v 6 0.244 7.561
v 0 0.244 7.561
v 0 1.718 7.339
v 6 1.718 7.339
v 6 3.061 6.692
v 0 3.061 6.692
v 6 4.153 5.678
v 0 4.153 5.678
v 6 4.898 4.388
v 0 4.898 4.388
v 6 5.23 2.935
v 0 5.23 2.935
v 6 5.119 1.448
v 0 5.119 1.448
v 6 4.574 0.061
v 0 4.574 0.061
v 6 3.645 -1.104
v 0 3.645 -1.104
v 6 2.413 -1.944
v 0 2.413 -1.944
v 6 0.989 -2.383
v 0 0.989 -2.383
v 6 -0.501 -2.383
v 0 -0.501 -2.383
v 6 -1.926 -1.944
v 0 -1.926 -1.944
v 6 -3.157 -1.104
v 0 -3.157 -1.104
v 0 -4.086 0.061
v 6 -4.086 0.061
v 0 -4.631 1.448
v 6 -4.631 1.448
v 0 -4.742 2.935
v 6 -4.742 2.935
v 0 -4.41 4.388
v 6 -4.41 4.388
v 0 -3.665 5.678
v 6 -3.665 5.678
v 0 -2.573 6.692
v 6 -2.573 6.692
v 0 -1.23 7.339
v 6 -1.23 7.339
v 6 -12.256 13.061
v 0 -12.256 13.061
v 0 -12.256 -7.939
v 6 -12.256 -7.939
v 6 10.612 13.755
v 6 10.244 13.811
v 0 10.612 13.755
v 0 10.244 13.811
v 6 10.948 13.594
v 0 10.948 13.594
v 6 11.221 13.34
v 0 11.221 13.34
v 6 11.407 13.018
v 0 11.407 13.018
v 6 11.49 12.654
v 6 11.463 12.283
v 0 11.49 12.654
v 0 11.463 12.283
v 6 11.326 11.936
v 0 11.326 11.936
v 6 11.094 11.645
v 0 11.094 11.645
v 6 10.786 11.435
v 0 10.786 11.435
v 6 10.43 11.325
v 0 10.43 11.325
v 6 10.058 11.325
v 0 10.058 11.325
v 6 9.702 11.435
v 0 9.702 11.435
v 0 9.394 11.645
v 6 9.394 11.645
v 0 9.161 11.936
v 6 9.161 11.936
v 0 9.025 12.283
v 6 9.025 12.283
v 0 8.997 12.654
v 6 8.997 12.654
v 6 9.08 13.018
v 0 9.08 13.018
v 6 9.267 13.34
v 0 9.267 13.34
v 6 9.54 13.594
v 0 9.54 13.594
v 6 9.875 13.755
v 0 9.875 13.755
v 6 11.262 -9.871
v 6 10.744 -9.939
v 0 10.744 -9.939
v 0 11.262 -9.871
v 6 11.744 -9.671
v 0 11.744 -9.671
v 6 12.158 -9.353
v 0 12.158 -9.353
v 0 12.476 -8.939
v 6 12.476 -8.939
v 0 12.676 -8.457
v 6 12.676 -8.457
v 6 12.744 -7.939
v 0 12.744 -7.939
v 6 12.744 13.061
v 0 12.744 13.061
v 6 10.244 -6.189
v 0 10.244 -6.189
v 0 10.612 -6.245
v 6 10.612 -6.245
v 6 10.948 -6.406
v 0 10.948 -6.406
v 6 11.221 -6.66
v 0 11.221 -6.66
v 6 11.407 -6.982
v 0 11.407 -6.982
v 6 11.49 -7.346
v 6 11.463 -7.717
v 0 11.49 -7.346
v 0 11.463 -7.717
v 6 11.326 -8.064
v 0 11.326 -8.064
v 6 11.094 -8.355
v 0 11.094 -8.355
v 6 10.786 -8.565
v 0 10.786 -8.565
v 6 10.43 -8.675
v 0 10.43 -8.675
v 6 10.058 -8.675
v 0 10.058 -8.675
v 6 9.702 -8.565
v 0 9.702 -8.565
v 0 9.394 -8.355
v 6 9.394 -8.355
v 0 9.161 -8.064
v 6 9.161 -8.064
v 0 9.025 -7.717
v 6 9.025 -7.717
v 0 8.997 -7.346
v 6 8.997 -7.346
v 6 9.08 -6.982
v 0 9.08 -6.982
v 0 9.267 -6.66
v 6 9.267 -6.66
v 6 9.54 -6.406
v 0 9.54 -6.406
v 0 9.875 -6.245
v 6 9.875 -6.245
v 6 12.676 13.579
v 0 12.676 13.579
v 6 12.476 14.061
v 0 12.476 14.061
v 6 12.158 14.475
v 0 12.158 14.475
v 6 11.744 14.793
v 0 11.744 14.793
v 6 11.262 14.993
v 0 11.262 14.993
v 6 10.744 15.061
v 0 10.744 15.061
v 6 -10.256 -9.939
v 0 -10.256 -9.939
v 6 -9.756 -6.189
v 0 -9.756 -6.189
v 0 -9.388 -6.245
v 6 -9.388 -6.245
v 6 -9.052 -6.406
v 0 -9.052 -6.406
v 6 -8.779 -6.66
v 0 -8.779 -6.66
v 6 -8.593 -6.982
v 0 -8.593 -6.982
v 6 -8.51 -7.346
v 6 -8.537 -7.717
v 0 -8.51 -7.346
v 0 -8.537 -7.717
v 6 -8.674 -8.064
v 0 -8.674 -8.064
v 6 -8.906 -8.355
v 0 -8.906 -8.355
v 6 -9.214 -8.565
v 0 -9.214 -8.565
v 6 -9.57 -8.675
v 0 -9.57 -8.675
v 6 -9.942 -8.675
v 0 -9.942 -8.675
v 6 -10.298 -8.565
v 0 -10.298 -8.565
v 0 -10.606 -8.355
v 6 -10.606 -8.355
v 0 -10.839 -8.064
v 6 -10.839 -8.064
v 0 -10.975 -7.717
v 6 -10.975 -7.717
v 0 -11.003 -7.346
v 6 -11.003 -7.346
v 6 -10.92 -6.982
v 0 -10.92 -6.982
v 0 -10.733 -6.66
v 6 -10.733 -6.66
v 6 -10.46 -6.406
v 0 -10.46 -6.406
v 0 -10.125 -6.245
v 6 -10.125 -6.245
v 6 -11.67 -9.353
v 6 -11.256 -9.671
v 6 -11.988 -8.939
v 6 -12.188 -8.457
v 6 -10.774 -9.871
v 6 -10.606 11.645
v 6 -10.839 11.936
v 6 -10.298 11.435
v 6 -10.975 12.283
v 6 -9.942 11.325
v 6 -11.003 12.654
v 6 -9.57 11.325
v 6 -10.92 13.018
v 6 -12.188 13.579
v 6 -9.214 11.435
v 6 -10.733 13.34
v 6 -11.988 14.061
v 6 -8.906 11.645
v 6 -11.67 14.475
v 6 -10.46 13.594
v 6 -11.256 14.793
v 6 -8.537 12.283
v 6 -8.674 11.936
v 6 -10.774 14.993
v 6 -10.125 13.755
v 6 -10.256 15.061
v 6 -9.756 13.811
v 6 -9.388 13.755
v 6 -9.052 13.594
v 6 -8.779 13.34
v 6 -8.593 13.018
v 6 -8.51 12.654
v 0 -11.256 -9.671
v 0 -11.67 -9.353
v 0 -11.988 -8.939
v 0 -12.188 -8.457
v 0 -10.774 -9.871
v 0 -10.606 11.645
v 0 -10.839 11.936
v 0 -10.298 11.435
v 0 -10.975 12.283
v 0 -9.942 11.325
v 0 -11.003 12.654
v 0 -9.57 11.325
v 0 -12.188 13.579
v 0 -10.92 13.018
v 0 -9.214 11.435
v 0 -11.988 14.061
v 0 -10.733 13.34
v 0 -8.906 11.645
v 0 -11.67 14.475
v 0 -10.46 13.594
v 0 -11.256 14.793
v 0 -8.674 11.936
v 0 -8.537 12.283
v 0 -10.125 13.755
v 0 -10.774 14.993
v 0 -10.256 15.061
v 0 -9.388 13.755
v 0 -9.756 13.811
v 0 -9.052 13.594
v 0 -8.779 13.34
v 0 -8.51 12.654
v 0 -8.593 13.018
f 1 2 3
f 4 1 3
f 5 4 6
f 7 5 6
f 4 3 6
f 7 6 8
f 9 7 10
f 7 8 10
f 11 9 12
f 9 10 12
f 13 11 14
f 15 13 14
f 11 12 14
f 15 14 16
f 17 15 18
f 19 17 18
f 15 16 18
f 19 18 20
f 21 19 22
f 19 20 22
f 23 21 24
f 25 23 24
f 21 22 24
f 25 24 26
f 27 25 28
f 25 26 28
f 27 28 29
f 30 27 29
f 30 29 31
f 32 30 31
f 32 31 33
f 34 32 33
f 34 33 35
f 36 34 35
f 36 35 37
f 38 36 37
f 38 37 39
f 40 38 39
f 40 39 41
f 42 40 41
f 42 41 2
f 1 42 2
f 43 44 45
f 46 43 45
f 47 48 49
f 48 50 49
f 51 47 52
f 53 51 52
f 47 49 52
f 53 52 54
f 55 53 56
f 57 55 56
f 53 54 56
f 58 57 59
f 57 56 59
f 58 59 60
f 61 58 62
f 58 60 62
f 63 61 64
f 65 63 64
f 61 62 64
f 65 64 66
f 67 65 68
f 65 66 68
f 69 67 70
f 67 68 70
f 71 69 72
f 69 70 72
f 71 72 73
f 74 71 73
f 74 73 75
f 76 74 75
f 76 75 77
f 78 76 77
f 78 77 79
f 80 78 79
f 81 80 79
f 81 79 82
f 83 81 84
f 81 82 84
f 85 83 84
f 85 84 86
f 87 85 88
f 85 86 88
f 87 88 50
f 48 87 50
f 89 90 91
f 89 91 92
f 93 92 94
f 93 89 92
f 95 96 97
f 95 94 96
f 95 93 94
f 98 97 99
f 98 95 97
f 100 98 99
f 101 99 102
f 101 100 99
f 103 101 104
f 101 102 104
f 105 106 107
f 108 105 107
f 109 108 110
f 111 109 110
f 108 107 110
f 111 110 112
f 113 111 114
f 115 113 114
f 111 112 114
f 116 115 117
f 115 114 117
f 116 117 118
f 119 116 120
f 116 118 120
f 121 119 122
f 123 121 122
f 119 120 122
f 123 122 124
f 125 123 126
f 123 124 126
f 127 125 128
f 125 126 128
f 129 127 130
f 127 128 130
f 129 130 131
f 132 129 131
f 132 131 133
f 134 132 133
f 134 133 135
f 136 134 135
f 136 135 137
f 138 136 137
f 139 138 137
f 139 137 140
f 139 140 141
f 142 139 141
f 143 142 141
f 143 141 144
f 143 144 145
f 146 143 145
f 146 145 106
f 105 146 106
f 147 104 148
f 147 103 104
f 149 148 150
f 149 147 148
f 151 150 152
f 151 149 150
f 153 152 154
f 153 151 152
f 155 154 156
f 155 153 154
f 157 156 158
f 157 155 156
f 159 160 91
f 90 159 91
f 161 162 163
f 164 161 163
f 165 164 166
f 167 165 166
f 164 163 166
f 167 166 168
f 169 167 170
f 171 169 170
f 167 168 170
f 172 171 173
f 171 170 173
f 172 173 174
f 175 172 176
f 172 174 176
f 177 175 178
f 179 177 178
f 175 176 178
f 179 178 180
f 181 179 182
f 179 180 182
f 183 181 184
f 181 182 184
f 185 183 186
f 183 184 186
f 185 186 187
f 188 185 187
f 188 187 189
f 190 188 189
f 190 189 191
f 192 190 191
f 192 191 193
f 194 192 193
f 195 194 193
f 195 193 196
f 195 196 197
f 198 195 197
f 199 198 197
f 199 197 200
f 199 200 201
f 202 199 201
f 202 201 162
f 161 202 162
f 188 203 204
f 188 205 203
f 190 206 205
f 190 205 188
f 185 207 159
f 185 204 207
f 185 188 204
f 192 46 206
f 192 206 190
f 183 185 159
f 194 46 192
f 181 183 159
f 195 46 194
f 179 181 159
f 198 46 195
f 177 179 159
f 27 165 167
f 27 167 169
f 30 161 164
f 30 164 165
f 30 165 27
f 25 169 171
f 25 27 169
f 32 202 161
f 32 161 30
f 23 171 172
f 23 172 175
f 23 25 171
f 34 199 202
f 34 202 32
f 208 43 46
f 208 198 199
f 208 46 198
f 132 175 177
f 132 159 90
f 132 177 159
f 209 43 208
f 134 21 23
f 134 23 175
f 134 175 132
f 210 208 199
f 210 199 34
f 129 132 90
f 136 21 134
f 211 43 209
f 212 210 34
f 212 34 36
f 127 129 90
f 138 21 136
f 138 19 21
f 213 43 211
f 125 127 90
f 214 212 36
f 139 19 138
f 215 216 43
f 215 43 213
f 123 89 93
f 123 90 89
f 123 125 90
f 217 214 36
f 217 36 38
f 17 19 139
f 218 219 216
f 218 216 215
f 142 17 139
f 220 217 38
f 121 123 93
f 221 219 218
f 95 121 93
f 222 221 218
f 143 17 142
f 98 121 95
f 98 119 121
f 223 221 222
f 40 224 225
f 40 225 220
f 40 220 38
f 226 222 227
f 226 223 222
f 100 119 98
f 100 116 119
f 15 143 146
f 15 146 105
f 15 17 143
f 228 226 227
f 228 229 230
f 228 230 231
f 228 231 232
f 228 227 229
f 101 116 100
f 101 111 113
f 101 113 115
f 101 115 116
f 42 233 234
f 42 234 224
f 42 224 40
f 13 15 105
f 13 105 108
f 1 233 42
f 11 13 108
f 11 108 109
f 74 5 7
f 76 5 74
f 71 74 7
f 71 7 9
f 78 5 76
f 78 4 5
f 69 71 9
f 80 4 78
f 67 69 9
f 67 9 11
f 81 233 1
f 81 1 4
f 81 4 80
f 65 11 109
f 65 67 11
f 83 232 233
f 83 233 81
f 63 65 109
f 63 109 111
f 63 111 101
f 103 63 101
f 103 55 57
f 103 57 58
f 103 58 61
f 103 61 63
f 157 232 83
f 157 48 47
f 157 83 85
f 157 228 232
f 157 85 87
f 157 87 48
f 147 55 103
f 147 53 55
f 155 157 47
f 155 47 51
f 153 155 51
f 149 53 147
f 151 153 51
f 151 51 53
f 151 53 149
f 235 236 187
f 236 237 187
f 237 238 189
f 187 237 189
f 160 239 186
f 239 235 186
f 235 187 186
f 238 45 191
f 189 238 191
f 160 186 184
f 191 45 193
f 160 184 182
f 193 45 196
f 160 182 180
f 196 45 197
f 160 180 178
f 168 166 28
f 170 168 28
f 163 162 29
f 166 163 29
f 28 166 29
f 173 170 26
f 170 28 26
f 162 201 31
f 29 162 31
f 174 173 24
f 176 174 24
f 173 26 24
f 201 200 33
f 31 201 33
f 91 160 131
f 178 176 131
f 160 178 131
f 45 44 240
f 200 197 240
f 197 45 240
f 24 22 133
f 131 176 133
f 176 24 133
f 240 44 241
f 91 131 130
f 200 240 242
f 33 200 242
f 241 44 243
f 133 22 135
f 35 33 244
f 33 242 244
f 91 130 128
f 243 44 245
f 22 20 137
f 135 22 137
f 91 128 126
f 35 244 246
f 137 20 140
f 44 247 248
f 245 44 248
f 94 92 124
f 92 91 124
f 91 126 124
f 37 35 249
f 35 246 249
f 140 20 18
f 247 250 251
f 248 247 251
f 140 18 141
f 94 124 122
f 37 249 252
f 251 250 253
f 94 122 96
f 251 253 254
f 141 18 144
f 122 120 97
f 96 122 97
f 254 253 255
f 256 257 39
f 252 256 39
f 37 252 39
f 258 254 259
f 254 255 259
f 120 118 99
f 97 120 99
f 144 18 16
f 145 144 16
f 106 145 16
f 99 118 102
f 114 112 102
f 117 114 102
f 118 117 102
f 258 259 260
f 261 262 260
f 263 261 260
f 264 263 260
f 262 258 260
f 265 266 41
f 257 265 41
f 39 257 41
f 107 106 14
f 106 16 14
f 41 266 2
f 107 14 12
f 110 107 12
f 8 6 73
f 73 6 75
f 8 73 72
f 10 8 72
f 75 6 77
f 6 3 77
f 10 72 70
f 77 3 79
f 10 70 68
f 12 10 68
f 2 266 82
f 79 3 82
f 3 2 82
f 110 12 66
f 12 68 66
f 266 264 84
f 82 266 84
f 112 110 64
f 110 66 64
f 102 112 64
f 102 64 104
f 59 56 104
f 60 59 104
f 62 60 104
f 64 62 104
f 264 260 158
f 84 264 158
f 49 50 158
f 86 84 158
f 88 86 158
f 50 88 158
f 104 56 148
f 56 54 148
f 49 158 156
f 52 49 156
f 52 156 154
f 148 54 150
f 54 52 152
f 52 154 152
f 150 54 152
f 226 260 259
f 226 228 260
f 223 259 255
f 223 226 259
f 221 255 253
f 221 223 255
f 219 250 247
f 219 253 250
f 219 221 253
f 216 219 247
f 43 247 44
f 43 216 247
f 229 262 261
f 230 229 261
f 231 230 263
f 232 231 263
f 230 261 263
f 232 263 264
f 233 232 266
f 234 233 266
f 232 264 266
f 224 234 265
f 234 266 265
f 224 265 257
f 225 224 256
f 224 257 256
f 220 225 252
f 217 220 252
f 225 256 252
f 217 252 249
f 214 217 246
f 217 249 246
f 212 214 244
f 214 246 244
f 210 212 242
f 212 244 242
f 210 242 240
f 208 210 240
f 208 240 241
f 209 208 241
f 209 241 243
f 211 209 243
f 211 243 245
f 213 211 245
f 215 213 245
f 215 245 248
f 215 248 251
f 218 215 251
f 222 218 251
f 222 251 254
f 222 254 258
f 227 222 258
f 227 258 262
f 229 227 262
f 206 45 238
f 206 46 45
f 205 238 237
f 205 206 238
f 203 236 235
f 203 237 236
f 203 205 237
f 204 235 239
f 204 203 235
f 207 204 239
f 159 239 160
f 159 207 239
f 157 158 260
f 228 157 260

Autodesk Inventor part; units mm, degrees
ref_plane "YZ Plane" through (0, 0, 0) normal (1, 0, 0) x (0, 1, 0)
ref_plane "XZ Plane" through (0, 0, 0) normal (0, 1, 0) x (-1, 0, 0)
ref_plane "XY Plane" through (0, 0, 0) normal (0, 0, 1) x (1, 0, 0)
sketch "Sketch1" plane through (0, 0, 0) normal (1, 0, 0) x (0, 1, 0)
  line L0 (12.7439, 15.061) -> (-12.2561, 15.061)
  line L1 (-12.2561, 15.061) -> (-12.2561, -9.939)
  line L2 (-12.2561, -9.939) -> (12.7439, -9.939)
  line L3 (12.7439, -9.939) -> (12.7439, 15.061)
  point P0 (0, 0)
  dimension "d0" = 25
  dimension "d1" = 25
extrude "Extrusion1" add sketch "Sketch1" along normal blind 6
fillet "Fillet1" radius 2 4 edges at (3, -12.2561, 15.061) (3, 12.7439, 15.061) (3, -12.2561, -9.939) (3, 12.7439, -9.939)
sketch "Sketch2" plane through (0, 0, 0) normal (-1, 0, 0) x (0, 0, 1)
  circle A0 centre (12.561, 10.2439) radius 1.25
  circle A1 centre (12.561, -9.7561) radius 1.25
  circle A2 centre (-7.439, -9.7561) radius 1.25
  circle A3 centre (-7.439, 10.2439) radius 1.25
  line L0 (15.061, 10.7439) -> (15.061, -10.2561) projected
  line L1 (-7.939, 12.7439) -> (13.061, 12.7439) projected
  line L2 (13.061, -12.2561) -> (-7.939, -12.2561) projected
  line L3 (-9.939, -10.2561) -> (-9.939, 10.7439) projected
  point P0 (0, 0)
  dimension "d5" = 2.5
  dimension "d6" = 2.5
  dimension "d7" = 2.5
  dimension "d8" = 2.5
  dimension "d9" = 2.5
  dimension "d10" = 2.5
  dimension "d11" = 2.5
  dimension "d12" = 2.5
  dimension "d13" = 2.5
  dimension "d14" = 2.5
  dimension "d15" = 2.5
  dimension "d16" = 2.5
extrude "Extrusion2" cut sketch "Sketch2" against normal through all
sketch "Sketch3" plane through (0, 0, 0) normal (-1, 0, 0) x (0, 0, 1)
  circle A0 centre (2.561, 0.2439) radius 5
  line L0 (13.061, -12.2561) -> (-7.939, -12.2561) projected
  line L1 (15.061, 10.7439) -> (15.061, -10.2561) projected
  point P0 (0, 0)
  dimension "d19" = 10
  dimension "d20" = 12.5
  dimension "d21" = 12.5
extrude "Extrusion3" cut sketch "Sketch3" against normal blind 10
properties part number "25mmx25mmx6mm_fan"
